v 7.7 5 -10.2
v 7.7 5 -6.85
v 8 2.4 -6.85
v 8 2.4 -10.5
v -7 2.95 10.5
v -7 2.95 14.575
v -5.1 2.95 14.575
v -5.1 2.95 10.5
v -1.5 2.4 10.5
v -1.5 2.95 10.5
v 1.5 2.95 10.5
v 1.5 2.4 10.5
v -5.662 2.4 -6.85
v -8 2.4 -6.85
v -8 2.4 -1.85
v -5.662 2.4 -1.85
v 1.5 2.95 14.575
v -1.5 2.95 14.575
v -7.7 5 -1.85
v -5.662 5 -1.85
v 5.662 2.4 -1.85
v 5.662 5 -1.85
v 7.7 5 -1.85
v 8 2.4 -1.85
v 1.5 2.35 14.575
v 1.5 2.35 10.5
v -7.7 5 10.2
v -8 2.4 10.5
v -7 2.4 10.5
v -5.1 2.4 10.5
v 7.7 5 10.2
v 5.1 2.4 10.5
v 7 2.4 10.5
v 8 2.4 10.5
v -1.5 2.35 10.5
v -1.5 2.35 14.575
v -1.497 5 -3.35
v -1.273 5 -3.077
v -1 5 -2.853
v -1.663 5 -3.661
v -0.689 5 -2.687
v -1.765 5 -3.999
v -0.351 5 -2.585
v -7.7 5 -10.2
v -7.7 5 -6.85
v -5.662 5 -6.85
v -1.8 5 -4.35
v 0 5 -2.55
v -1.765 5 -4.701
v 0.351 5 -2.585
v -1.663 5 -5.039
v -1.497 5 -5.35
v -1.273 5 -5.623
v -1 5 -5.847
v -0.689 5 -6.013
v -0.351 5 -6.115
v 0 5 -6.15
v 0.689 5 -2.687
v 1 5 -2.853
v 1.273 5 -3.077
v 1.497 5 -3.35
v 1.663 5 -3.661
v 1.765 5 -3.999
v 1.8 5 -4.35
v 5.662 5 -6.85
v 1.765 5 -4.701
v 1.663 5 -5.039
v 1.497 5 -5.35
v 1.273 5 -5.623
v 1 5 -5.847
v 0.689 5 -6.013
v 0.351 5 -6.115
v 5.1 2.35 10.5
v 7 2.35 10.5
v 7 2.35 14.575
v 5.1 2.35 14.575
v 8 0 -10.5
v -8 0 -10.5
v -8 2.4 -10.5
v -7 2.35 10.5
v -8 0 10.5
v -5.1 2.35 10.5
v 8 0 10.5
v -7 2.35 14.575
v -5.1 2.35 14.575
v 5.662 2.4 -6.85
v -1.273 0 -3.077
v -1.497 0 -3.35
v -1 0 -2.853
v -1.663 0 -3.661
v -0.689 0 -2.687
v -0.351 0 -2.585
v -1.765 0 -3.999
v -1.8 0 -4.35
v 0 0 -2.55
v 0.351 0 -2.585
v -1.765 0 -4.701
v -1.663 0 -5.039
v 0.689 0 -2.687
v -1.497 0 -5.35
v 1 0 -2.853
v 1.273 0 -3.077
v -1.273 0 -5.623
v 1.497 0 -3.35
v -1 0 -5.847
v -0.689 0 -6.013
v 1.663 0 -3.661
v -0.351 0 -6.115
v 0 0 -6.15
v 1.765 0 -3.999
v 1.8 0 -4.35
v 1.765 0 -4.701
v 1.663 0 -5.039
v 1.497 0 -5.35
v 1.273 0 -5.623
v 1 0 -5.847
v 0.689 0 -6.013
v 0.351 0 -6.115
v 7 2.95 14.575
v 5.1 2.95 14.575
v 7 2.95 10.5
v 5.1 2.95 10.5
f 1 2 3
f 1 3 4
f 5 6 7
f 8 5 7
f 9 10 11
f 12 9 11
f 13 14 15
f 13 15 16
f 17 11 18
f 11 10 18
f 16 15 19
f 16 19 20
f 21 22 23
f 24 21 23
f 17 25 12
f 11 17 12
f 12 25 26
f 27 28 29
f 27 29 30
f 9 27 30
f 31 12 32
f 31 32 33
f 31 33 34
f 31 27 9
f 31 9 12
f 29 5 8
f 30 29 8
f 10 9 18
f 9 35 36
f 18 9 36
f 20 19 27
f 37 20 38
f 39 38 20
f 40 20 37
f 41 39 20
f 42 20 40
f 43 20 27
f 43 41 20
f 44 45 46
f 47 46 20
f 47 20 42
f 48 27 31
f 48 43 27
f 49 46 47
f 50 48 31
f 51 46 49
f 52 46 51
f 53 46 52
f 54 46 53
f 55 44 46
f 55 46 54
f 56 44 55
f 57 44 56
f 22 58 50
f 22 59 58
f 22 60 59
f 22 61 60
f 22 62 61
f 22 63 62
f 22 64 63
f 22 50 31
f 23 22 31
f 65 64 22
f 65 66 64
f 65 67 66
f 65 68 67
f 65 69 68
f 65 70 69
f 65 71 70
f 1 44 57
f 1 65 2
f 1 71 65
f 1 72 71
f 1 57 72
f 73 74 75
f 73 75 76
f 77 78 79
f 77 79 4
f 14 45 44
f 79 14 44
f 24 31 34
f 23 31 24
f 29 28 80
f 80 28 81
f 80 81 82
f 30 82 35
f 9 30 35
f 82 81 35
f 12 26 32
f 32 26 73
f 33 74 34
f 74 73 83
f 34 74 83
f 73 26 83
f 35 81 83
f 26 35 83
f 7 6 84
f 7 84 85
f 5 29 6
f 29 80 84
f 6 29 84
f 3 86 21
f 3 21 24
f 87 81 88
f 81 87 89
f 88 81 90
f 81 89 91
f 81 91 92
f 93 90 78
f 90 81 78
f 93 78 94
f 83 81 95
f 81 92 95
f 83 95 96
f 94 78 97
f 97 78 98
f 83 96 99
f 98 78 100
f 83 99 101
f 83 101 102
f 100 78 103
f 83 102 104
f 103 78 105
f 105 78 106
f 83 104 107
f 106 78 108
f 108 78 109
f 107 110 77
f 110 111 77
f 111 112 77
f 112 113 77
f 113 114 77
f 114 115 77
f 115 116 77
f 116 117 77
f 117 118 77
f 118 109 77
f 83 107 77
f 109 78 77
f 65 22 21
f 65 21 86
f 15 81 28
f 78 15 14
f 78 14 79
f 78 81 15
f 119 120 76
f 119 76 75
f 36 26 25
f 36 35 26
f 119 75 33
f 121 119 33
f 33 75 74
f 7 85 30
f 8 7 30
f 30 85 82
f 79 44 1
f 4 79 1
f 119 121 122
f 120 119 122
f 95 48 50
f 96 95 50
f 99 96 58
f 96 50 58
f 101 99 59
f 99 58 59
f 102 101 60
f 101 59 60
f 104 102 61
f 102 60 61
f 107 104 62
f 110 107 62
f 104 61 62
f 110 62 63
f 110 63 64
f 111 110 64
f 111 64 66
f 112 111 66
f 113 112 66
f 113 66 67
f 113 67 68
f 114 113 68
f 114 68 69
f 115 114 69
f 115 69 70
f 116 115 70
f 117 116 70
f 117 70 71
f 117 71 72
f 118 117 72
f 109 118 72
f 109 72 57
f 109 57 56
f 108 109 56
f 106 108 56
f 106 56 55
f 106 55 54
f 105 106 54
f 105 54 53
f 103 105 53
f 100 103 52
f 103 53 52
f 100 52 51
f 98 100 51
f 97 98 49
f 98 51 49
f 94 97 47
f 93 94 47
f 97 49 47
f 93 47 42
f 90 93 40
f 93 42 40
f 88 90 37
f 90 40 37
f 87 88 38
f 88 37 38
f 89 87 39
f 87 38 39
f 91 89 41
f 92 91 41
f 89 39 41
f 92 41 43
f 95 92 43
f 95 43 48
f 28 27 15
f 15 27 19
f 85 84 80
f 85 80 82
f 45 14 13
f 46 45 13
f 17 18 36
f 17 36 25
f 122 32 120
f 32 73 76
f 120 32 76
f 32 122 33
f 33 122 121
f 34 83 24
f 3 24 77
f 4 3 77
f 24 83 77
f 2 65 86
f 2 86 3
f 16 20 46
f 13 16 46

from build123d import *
from OCP.BRepFilletAPI import BRepFilletAPI_MakeChamfer

# Parameters (mm, degrees)
SKETCH1_W           = 16
SKETCH1_H           = 21
BOSS_EXTRUDE1_DEPTH = 5
SKETCH2_W           = 2.338235294
SKETCH2_H           = 5
CUT_EXTRUDE1_DEPTH  = 2.6
SKETCH3_R           = 1.8
CUT_EXTRUDE2_DEPTH  = 15.115594213
CHAMFER1_SIZE       = 2.6
CHAMFER1_SIZE2      = 0.3
SKETCH4_W           = 1.9
SKETCH4_H           = 0.6
SKETCH4_W_2         = 3
BOSS_EXTRUDE2_DEPTH = 4.5
SKETCH5_W           = 1.2
SKETCH5_H           = 0.6
BOSS_EXTRUDE3_DEPTH = 15.5
CHAMFER2_SIZE       = 0.4
CHAMFER3_SIZE       = 1
CHAMFER4_SIZE       = 0.5
SKETCH6_W           = 21.119407152
SKETCH6_H           = 13.185156935
CUT_EXTRUDE3_DEPTH  = 32.669425318
SKETCH7_W           = 15.715970721
SKETCH7_H           = 3.676449557
CUT_EXTRUDE4_DEPTH  = 20.696256624


with BuildPart() as part:
    # Sketch1 → Boss-Extrude1 (new body)
    with BuildSketch(Plane(origin=(0, 0, 0), x_dir=(1, 0, 0), z_dir=(0, 1, 0))):
        Rectangle(SKETCH1_W, SKETCH1_H)
    extrude(amount=BOSS_EXTRUDE1_DEPTH)

    # Sketch2 → Cut-Extrude1 (cut)
    with BuildSketch(Plane(origin=(0, 5, 0), x_dir=(1, 0, 0), z_dir=(0, 1, 0))):
        with Locations((-6.830882353, 4.35)):
            Rectangle(SKETCH2_W, SKETCH2_H)
        with Locations((6.830882353, 4.35)):
            Rectangle(SKETCH2_W, SKETCH2_H)
    extrude(amount=-CUT_EXTRUDE1_DEPTH, mode=Mode.SUBTRACT)

    # Sketch3 → Cut-Extrude2 (cut, through all)
    with BuildSketch(Plane(origin=(0, 5, 0), x_dir=(1, 0, 0), z_dir=(0, 1, 0))):
        with Locations(Location((0, 4.35, 0), (0, 0, 270))):
            Circle(SKETCH3_R)
    extrude(amount=-CUT_EXTRUDE2_DEPTH, mode=Mode.SUBTRACT)

    # Chamfer1: one chamfer whose edges measure the first distance from different faces: ONE call of the kernel's chamfer builder (chamfer() names one face for all edges)
    chamfer1_edges_1 = [part.edges().sort_by_distance(p)[0] for p in [
        (8, 5, 4.325),
        (8, 5, -8.675),
    ]]
    chamfer1_side_1 = [part.faces().sort_by_distance(p)[0] for p in [
        (8, 2.330434783, 0.614673913),
    ]]
    chamfer1_edges_2 = [part.edges().sort_by_distance(p)[0] for p in [
        (-8, 5, 4.325),
        (-8, 5, -8.675),
    ]]
    chamfer1_side_2 = [part.faces().sort_by_distance(p)[0] for p in [
        (-8, 2.330434783, 0.614673913),
    ]]
    chamfer1_edges_3 = [part.edges().sort_by_distance(p)[0] for p in [
        (0, 5, -10.5),
    ]]
    chamfer1_side_3 = [part.faces().sort_by_distance(p)[0] for p in [
        (0, 2.5, -10.5),
    ]]
    chamfer1_edges_4 = [part.edges().sort_by_distance(p)[0] for p in [
        (0, 5, 10.5),
    ]]
    chamfer1_side_4 = [part.faces().sort_by_distance(p)[0] for p in [
        (0, 2.5, 10.5),
    ]]
    chamfer1 = BRepFilletAPI_MakeChamfer(part.part.solid().wrapped)
    for e in chamfer1_edges_1:
        chamfer1.Add(CHAMFER1_SIZE, CHAMFER1_SIZE2, e.wrapped, chamfer1_side_1[0].wrapped)  # the first distance lies on this face
    for e in chamfer1_edges_2:
        chamfer1.Add(CHAMFER1_SIZE, CHAMFER1_SIZE2, e.wrapped, chamfer1_side_2[0].wrapped)  # the first distance lies on this face
    for e in chamfer1_edges_3:
        chamfer1.Add(CHAMFER1_SIZE, CHAMFER1_SIZE2, e.wrapped, chamfer1_side_3[0].wrapped)  # the first distance lies on this face
    for e in chamfer1_edges_4:
        chamfer1.Add(CHAMFER1_SIZE, CHAMFER1_SIZE2, e.wrapped, chamfer1_side_4[0].wrapped)  # the first distance lies on this face
    add(Compound.cast(chamfer1.Shape()), mode=Mode.REPLACE)

    # Sketch4 → Boss-Extrude2 (add)
    with BuildSketch(Plane.XY.offset(10.5)):
        with Locations((-6.05, 2.65)):
            Rectangle(SKETCH4_W, SKETCH4_H)
        with Locations((6.05, 2.65)):
            Rectangle(SKETCH4_W, SKETCH4_H)
        with Locations((0, 2.65)):
            Rectangle(SKETCH4_W_2, SKETCH4_H)
    extrude(amount=BOSS_EXTRUDE2_DEPTH)

    # Sketch5 → Boss-Extrude3 (add)
    with BuildSketch(Plane.XY.offset(15)):
        with Locations((-6.05, 2.65)):
            Rectangle(SKETCH5_W, SKETCH5_H)
        with Locations((0, 2.65)):
            Rectangle(SKETCH5_W, SKETCH5_H)
        with Locations((6.05, 2.65)):
            Rectangle(SKETCH5_W, SKETCH5_H)
    extrude(amount=BOSS_EXTRUDE3_DEPTH)

    # Chamfer2
    # the kernel refuses this chamfer: 0.4 mm, written as the material it adds along each edge
    with BuildSketch(Plane(origin=(-5.45, 2.35, 15), x_dir=(0.9996219169112966, 0, -0.027495876610587302), z_dir=(0, 1, 0))) as chamfer2_piece_1_section:
        Polygon((CHAMFER2_SIZE * 0.999621916911, -CHAMFER2_SIZE * 0.0274958766106), (-CHAMFER2_SIZE * 0.0274958766106, -CHAMFER2_SIZE * 0.999621916911), (0, 0), align=None)
    chamfer2_piece_1 = extrude(amount=0.6, mode=Mode.PRIVATE)
    chamfer2_piece_1 = split(chamfer2_piece_1, bisect_by=Plane(origin=(-5.1, 2.65, 15.135195933), z_dir=(-1, 0, 0)), keep=Keep.TOP, mode=Mode.PRIVATE)
    add(chamfer2_piece_1)
    with BuildSketch(Plane(origin=(6.65, 2.95, 15), x_dir=(0.9996219169112966, 0, -0.027495876610587302), z_dir=(0, -1, 0))) as chamfer2_piece_2_section:
        Polygon((CHAMFER2_SIZE * 0.999621916911, CHAMFER2_SIZE * 0.0274958766106), (-CHAMFER2_SIZE * 0.0274958766106, CHAMFER2_SIZE * 0.999621916911), (0, 0), align=None)
    chamfer2_piece_2 = extrude(amount=0.6, mode=Mode.PRIVATE)
    chamfer2_piece_2 = split(chamfer2_piece_2, bisect_by=Plane(origin=(7, 2.65, 15.135195933), z_dir=(-1, 0, 0)), keep=Keep.TOP, mode=Mode.PRIVATE)
    add(chamfer2_piece_2)
    with BuildSketch(Plane(origin=(5.45, 2.35, 15), x_dir=(-0.9996219169112966, 0, -0.027495876610587302), z_dir=(0, 1, 0))) as chamfer2_piece_3_section:
        Polygon((CHAMFER2_SIZE * 0.999621916911, CHAMFER2_SIZE * 0.0274958766106), (-CHAMFER2_SIZE * 0.0274958766106, CHAMFER2_SIZE * 0.999621916911), (0, 0), align=None)
    chamfer2_piece_3 = extrude(amount=0.6, mode=Mode.PRIVATE)
    chamfer2_piece_3 = split(chamfer2_piece_3, bisect_by=Plane(origin=(5.1, 2.65, 15.135195933), z_dir=(1, 0, 0)), keep=Keep.TOP, mode=Mode.PRIVATE)
    add(chamfer2_piece_3)
    with BuildSketch(Plane(origin=(-6.65, 2.95, 15), x_dir=(-0.9996219169112966, 0, -0.027495876610587302), z_dir=(0, -1, 0))) as chamfer2_piece_4_section:
        Polygon((CHAMFER2_SIZE * 0.999621916911, -CHAMFER2_SIZE * 0.0274958766106), (-CHAMFER2_SIZE * 0.0274958766106, -CHAMFER2_SIZE * 0.999621916911), (0, 0), align=None)
    chamfer2_piece_4 = extrude(amount=0.6, mode=Mode.PRIVATE)
    chamfer2_piece_4 = split(chamfer2_piece_4, bisect_by=Plane(origin=(-7, 2.65, 15.135195933), z_dir=(1, 0, 0)), keep=Keep.TOP, mode=Mode.PRIVATE)
    add(chamfer2_piece_4)

    # Chamfer3
    # the kernel refuses this chamfer: 1 mm, written as the material it adds along each edge
    with BuildSketch(Plane(origin=(0.6, 2.35, 15), x_dir=(0.9996219169112968, 0, -0.027495876610585623), z_dir=(0, 1, 0))) as chamfer3_piece_1_section:
        Polygon((CHAMFER3_SIZE * 0.999621916911, -CHAMFER3_SIZE * 0.0274958766106), (-CHAMFER3_SIZE * 0.0274958766106, -CHAMFER3_SIZE * 0.999621916911), (0, 0), align=None)
    chamfer3_piece_1 = extrude(amount=0.6, mode=Mode.PRIVATE)
    chamfer3_piece_1 = split(chamfer3_piece_1, bisect_by=Plane(origin=(1.5, 2.65, 15.335900747), z_dir=(-1, 0, 0)), keep=Keep.TOP, mode=Mode.PRIVATE)
    add(chamfer3_piece_1)
    with BuildSketch(Plane(origin=(-0.6, 2.95, 15), x_dir=(0.02749587661058645, 0, 0.9996219169112968), z_dir=(0, -1, 0))) as chamfer3_piece_2_section:
        Polygon((CHAMFER3_SIZE * 0.999621916911, CHAMFER3_SIZE * 0.0274958766106), (-CHAMFER3_SIZE * 0.0274958766106, CHAMFER3_SIZE * 0.999621916911), (0, 0), align=None)
    chamfer3_piece_2 = extrude(amount=0.6, mode=Mode.PRIVATE)
    chamfer3_piece_2 = split(chamfer3_piece_2, bisect_by=Plane(origin=(-1.5, 2.65, 15.335900747), z_dir=(1, 0, 0)), keep=Keep.TOP, mode=Mode.PRIVATE)
    add(chamfer3_piece_2)

    # Chamfer4
    chamfer4_edges = [part.edges().sort_by_distance(p)[0] for p in [
        (5.45, 2.65, 30.5),
        (6.65, 2.65, 30.5),
        (0.6, 2.65, 30.5),
        (-0.6, 2.65, 30.5),
        (-5.45, 2.65, 30.5),
        (-6.65, 2.65, 30.5),
    ]]
    chamfer(chamfer4_edges, length=CHAMFER4_SIZE)

    # Sketch6 → Cut-Extrude3 (cut, through all)
    with BuildSketch(Plane(origin=(0, 2.95, 0), x_dir=(1, 0, 0), z_dir=(0, 1, 0))):
        with Locations((0.165735258, -24.347578467)):
            Rectangle(SKETCH6_W, SKETCH6_H)
    extrude(amount=-CUT_EXTRUDE3_DEPTH, mode=Mode.SUBTRACT)

    # Sketch7 → Cut-Extrude4 (cut, through all)
    with BuildSketch(Plane(origin=(0, 2.95, 0), x_dir=(1, 0, 0), z_dir=(0, 1, 0))):
        with Locations((-0.142014639, -16.413224779)):
            Rectangle(SKETCH7_W, SKETCH7_H)
    extrude(amount=-CUT_EXTRUDE4_DEPTH, mode=Mode.SUBTRACT)


solid = part.part
